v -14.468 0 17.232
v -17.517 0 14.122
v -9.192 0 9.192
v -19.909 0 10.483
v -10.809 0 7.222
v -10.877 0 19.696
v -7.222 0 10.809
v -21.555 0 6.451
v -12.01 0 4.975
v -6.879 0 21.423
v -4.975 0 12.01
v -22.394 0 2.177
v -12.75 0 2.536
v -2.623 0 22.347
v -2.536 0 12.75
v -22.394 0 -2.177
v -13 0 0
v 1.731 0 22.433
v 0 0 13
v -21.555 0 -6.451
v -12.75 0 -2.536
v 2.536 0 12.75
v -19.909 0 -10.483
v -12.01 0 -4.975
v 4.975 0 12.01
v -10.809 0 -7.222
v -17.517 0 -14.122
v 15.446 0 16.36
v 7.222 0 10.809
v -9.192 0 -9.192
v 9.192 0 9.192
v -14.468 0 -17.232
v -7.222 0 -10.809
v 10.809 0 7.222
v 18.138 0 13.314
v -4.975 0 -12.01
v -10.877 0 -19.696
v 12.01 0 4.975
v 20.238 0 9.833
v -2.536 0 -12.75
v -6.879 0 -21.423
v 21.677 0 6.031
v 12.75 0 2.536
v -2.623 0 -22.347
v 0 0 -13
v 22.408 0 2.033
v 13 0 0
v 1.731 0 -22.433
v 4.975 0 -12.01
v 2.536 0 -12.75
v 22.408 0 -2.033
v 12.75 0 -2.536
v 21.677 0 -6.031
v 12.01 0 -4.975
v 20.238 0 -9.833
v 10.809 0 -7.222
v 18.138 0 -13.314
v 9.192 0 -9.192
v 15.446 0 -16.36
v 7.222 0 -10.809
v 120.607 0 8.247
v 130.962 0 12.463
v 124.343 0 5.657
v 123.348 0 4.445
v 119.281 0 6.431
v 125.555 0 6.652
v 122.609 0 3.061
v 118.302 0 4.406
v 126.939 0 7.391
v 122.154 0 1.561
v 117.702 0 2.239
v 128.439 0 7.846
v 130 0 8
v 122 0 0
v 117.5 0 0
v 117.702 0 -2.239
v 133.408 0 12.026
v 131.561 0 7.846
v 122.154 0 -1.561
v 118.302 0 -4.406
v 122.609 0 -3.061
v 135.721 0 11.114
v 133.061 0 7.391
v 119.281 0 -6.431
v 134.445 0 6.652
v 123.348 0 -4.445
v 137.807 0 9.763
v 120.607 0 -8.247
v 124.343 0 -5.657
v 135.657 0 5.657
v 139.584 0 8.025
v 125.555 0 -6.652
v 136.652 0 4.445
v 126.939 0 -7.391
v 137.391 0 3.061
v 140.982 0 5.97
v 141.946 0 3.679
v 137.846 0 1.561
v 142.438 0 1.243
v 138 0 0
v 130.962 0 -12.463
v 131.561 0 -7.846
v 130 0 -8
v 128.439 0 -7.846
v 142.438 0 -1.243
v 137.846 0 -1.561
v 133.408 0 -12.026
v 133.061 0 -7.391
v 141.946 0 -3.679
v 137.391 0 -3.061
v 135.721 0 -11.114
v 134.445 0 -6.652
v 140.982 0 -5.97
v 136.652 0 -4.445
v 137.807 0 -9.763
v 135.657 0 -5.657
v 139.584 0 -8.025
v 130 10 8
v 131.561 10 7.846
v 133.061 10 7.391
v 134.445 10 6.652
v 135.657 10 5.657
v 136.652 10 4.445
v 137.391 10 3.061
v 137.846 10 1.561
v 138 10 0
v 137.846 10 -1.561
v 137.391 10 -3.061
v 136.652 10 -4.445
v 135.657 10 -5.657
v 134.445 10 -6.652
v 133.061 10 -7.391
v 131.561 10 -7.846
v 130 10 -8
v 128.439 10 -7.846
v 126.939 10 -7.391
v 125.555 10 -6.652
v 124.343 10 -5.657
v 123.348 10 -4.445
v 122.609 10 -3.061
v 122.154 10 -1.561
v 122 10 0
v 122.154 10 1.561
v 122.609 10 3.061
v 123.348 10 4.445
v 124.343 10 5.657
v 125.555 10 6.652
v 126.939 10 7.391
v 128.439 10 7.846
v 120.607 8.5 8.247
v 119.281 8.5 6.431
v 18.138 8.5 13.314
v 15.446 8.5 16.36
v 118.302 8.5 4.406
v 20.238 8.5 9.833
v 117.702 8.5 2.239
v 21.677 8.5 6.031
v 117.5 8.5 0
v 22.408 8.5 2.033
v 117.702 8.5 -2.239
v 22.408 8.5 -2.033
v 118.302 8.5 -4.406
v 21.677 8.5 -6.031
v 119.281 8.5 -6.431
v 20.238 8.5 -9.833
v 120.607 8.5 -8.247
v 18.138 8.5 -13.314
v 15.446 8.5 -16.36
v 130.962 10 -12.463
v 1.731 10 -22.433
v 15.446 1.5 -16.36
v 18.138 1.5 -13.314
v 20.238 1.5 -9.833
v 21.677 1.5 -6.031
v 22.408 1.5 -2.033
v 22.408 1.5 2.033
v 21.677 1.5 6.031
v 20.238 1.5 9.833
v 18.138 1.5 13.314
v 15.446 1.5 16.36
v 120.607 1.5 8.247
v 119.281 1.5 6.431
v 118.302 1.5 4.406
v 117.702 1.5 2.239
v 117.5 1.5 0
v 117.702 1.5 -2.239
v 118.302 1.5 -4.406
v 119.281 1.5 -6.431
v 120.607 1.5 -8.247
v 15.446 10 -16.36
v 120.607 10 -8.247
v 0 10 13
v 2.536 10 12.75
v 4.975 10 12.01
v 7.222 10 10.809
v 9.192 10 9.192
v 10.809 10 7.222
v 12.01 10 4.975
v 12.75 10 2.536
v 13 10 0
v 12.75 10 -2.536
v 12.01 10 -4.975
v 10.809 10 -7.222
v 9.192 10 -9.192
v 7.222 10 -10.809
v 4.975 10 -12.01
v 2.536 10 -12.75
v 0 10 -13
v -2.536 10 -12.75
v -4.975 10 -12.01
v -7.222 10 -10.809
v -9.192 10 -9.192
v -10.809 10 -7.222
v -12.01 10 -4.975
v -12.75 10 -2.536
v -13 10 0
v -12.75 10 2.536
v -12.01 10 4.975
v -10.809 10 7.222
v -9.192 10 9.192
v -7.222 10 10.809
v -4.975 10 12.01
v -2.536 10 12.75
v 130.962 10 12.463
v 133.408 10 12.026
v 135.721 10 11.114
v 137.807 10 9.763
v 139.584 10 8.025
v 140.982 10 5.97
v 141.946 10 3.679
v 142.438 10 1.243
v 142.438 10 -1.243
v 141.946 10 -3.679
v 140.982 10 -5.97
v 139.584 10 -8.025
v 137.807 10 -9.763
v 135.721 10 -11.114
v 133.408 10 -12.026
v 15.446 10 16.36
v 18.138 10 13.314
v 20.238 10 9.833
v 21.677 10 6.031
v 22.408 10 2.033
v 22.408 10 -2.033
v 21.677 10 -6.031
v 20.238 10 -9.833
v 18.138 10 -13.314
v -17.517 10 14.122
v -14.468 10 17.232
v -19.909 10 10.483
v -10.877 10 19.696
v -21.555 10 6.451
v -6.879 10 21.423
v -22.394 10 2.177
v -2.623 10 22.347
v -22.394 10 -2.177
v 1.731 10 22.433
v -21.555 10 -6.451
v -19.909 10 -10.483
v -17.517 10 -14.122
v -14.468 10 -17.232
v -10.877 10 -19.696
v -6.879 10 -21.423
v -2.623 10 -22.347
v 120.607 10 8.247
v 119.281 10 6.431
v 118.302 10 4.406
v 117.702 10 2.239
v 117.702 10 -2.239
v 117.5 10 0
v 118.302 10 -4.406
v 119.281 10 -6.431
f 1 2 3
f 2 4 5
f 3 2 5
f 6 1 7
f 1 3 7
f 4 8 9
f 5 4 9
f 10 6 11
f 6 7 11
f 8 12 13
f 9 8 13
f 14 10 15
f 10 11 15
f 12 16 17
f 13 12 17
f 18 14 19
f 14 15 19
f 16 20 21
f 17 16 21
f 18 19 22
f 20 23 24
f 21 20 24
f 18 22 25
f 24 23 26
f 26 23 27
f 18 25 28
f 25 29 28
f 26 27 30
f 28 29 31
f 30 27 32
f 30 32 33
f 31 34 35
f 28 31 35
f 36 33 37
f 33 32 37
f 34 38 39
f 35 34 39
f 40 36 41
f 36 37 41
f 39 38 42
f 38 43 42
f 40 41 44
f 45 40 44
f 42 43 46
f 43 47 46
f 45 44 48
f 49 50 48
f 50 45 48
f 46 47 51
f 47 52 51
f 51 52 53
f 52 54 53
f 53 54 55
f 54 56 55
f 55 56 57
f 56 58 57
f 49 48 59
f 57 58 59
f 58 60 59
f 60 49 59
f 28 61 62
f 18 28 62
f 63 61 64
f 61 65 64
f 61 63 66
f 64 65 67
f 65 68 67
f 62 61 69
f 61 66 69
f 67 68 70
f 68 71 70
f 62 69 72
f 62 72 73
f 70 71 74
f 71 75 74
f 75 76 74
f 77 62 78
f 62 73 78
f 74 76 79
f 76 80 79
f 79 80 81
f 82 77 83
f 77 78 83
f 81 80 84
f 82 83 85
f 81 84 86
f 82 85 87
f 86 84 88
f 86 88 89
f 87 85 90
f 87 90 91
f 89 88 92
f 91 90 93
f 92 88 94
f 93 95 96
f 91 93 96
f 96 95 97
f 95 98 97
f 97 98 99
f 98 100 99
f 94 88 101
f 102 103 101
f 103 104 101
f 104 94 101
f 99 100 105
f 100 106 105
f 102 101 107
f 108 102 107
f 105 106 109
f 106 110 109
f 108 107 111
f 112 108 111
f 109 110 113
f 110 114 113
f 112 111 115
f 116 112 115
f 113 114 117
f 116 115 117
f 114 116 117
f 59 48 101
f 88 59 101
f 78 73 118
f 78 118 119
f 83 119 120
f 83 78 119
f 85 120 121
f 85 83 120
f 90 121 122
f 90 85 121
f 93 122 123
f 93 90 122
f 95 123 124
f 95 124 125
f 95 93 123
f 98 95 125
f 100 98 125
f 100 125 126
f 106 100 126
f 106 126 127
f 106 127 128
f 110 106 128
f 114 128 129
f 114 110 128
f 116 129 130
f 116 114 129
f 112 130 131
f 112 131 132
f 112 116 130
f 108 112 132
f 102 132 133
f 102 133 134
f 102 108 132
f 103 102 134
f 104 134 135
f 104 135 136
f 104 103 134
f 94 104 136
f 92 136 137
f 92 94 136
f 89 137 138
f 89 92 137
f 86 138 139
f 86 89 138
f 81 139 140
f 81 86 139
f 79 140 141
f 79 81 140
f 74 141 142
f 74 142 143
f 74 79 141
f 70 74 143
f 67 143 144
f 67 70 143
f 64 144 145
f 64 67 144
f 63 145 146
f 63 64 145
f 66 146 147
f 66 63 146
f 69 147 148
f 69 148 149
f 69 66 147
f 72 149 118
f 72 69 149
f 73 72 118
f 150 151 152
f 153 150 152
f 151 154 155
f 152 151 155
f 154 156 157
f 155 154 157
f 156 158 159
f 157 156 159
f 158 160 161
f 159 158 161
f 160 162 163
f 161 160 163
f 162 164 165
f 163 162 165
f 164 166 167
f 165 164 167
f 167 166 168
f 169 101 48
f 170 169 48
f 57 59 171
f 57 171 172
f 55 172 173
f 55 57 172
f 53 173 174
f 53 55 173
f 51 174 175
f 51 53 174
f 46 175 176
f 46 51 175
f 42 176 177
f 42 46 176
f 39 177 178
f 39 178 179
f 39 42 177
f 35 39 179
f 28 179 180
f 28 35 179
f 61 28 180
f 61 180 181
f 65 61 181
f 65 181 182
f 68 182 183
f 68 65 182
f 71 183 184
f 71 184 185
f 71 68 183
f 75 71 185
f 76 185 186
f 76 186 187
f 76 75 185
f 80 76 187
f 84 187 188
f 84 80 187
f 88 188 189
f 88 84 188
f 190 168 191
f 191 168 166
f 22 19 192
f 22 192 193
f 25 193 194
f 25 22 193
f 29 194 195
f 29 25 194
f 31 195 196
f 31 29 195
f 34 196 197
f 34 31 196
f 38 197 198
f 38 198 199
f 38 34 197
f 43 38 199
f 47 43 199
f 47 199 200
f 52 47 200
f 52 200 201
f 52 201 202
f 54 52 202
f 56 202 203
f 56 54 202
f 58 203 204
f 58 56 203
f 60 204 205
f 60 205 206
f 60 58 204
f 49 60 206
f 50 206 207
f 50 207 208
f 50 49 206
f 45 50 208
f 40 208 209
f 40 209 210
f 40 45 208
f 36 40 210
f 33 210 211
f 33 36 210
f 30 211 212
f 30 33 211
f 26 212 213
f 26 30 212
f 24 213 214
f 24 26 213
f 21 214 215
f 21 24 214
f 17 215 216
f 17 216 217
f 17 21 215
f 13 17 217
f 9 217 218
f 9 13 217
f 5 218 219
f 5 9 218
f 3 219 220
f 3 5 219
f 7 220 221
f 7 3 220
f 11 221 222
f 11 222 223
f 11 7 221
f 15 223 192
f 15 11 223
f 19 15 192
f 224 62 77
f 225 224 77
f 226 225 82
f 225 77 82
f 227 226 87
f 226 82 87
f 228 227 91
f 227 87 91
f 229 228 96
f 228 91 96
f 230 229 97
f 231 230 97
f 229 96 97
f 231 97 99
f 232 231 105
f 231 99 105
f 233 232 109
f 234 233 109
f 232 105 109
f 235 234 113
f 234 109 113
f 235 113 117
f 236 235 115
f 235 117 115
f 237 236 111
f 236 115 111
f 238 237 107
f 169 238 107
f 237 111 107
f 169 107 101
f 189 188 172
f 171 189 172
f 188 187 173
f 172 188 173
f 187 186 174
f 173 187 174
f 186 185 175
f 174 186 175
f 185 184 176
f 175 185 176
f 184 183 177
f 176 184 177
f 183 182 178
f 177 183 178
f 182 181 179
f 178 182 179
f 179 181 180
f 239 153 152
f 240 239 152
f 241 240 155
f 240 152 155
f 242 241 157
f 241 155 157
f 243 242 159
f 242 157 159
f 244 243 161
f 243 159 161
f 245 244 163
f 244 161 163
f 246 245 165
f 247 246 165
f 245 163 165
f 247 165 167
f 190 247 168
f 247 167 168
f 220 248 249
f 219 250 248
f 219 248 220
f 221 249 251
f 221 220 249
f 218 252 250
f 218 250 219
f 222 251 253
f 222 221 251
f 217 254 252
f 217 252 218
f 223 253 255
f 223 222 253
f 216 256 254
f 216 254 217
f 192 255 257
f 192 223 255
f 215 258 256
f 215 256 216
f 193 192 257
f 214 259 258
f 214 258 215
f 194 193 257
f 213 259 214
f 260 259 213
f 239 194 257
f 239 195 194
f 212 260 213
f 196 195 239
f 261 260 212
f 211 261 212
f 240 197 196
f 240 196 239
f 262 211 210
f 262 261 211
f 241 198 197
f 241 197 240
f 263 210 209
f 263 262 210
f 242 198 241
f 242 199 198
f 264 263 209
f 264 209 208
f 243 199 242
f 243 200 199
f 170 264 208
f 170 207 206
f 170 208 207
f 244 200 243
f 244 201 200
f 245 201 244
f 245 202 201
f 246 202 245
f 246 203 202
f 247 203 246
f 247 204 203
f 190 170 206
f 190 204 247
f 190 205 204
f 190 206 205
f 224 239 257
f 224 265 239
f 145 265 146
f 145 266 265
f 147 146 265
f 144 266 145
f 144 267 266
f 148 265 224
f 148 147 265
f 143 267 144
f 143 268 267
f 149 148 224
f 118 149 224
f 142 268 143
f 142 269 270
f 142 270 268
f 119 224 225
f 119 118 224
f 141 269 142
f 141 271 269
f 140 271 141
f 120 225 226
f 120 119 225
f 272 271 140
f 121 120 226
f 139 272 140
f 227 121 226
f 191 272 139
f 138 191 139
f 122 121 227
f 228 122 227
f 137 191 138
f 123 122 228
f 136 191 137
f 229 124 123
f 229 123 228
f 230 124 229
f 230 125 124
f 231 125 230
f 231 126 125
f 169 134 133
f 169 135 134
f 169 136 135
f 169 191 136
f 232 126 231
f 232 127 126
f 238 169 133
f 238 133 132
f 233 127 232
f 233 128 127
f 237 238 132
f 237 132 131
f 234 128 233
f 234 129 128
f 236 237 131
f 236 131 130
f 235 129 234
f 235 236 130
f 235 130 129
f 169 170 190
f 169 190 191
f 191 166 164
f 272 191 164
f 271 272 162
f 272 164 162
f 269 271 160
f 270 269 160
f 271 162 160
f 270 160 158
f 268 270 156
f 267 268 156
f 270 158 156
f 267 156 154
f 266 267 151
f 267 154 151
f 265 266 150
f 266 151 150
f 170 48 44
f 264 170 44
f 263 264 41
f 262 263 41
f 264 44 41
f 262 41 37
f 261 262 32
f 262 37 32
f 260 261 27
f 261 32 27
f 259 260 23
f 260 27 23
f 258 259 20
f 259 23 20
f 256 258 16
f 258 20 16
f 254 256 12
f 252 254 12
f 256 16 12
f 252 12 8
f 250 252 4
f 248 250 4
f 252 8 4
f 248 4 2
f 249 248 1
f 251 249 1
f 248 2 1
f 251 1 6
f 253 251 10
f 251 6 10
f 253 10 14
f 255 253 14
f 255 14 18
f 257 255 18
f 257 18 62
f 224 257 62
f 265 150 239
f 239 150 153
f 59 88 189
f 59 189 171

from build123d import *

# Parameters (mm, degrees)
SKETCH1_R           = 13
SKETCH1_R_2         = 8
BOSS_EXTRUDE2_DEPTH = 10
CUT_EXTRUDE1_START  = -1.5
CUT_EXTRUDE1_DEPTH  = 1.5
CUT_EXTRUDE2_DEPTH  = 1.5


with BuildPart() as part:
    # Sketch1 → Boss-Extrude2 (new body)
    with BuildSketch(Plane(origin=(0, 0, 0), x_dir=(1, 0, 0), z_dir=(0, 1, 0))):
        with BuildLine():
            ThreePointArc((1.730769231, 22.433333187), (-22.5, 0), (1.730769231, -22.433333187))
            Line((1.730769231, -22.433333187), (130.961538462, -12.462962882))
            ThreePointArc((130.961538462, -12.462962882), (142.5, 0), (130.961538462, 12.462962882))
            Line((130.961538462, 12.462962882), (1.730769231, 22.433333187))
        make_face()
        with Locations(Location((0, 0, 0), (0, 0, 270))):
            Circle(SKETCH1_R, mode=Mode.SUBTRACT)
        with Locations(Location((130, 0, 0), (0, 0, 270))):
            Circle(SKETCH1_R_2, mode=Mode.SUBTRACT)
    extrude(amount=BOSS_EXTRUDE2_DEPTH)

    # Sketch3 → Cut-Extrude1 (cut)
    with BuildSketch(Plane(origin=(0, 10, 0), x_dir=(1, 0, 0), z_dir=(0, 1, 0)).offset(CUT_EXTRUDE1_START)):
        with BuildLine():
            Line((15.446386754, 16.360291448), (120.606552772, 8.247008498))
            ThreePointArc((120.606552772, 8.247008498), (117.5, 0), (120.606552772, -8.247008498))
            Line((120.606552772, -8.247008498), (15.446386754, -16.360291448))
            ThreePointArc((15.446386754, -16.360291448), (22.5, 0), (15.446386754, 16.360291448))
        make_face()
    extrude(amount=CUT_EXTRUDE1_DEPTH, mode=Mode.SUBTRACT)

    # Sketch5 → Cut-Extrude2 (cut)
    with BuildSketch(Plane.XZ):
        with BuildLine():
            Line((15.446386754, 16.360291448), (120.606552772, 8.247008498))
            ThreePointArc((120.606552772, 8.247008498), (117.5, 0), (120.606552772, -8.247008498))
            Line((120.606552772, -8.247008498), (15.446386754, -16.360291448))
            ThreePointArc((15.446386754, -16.360291448), (22.5, 0), (15.446386754, 16.360291448))
        make_face()
    extrude(amount=-CUT_EXTRUDE2_DEPTH, mode=Mode.SUBTRACT)


solid = part.part
